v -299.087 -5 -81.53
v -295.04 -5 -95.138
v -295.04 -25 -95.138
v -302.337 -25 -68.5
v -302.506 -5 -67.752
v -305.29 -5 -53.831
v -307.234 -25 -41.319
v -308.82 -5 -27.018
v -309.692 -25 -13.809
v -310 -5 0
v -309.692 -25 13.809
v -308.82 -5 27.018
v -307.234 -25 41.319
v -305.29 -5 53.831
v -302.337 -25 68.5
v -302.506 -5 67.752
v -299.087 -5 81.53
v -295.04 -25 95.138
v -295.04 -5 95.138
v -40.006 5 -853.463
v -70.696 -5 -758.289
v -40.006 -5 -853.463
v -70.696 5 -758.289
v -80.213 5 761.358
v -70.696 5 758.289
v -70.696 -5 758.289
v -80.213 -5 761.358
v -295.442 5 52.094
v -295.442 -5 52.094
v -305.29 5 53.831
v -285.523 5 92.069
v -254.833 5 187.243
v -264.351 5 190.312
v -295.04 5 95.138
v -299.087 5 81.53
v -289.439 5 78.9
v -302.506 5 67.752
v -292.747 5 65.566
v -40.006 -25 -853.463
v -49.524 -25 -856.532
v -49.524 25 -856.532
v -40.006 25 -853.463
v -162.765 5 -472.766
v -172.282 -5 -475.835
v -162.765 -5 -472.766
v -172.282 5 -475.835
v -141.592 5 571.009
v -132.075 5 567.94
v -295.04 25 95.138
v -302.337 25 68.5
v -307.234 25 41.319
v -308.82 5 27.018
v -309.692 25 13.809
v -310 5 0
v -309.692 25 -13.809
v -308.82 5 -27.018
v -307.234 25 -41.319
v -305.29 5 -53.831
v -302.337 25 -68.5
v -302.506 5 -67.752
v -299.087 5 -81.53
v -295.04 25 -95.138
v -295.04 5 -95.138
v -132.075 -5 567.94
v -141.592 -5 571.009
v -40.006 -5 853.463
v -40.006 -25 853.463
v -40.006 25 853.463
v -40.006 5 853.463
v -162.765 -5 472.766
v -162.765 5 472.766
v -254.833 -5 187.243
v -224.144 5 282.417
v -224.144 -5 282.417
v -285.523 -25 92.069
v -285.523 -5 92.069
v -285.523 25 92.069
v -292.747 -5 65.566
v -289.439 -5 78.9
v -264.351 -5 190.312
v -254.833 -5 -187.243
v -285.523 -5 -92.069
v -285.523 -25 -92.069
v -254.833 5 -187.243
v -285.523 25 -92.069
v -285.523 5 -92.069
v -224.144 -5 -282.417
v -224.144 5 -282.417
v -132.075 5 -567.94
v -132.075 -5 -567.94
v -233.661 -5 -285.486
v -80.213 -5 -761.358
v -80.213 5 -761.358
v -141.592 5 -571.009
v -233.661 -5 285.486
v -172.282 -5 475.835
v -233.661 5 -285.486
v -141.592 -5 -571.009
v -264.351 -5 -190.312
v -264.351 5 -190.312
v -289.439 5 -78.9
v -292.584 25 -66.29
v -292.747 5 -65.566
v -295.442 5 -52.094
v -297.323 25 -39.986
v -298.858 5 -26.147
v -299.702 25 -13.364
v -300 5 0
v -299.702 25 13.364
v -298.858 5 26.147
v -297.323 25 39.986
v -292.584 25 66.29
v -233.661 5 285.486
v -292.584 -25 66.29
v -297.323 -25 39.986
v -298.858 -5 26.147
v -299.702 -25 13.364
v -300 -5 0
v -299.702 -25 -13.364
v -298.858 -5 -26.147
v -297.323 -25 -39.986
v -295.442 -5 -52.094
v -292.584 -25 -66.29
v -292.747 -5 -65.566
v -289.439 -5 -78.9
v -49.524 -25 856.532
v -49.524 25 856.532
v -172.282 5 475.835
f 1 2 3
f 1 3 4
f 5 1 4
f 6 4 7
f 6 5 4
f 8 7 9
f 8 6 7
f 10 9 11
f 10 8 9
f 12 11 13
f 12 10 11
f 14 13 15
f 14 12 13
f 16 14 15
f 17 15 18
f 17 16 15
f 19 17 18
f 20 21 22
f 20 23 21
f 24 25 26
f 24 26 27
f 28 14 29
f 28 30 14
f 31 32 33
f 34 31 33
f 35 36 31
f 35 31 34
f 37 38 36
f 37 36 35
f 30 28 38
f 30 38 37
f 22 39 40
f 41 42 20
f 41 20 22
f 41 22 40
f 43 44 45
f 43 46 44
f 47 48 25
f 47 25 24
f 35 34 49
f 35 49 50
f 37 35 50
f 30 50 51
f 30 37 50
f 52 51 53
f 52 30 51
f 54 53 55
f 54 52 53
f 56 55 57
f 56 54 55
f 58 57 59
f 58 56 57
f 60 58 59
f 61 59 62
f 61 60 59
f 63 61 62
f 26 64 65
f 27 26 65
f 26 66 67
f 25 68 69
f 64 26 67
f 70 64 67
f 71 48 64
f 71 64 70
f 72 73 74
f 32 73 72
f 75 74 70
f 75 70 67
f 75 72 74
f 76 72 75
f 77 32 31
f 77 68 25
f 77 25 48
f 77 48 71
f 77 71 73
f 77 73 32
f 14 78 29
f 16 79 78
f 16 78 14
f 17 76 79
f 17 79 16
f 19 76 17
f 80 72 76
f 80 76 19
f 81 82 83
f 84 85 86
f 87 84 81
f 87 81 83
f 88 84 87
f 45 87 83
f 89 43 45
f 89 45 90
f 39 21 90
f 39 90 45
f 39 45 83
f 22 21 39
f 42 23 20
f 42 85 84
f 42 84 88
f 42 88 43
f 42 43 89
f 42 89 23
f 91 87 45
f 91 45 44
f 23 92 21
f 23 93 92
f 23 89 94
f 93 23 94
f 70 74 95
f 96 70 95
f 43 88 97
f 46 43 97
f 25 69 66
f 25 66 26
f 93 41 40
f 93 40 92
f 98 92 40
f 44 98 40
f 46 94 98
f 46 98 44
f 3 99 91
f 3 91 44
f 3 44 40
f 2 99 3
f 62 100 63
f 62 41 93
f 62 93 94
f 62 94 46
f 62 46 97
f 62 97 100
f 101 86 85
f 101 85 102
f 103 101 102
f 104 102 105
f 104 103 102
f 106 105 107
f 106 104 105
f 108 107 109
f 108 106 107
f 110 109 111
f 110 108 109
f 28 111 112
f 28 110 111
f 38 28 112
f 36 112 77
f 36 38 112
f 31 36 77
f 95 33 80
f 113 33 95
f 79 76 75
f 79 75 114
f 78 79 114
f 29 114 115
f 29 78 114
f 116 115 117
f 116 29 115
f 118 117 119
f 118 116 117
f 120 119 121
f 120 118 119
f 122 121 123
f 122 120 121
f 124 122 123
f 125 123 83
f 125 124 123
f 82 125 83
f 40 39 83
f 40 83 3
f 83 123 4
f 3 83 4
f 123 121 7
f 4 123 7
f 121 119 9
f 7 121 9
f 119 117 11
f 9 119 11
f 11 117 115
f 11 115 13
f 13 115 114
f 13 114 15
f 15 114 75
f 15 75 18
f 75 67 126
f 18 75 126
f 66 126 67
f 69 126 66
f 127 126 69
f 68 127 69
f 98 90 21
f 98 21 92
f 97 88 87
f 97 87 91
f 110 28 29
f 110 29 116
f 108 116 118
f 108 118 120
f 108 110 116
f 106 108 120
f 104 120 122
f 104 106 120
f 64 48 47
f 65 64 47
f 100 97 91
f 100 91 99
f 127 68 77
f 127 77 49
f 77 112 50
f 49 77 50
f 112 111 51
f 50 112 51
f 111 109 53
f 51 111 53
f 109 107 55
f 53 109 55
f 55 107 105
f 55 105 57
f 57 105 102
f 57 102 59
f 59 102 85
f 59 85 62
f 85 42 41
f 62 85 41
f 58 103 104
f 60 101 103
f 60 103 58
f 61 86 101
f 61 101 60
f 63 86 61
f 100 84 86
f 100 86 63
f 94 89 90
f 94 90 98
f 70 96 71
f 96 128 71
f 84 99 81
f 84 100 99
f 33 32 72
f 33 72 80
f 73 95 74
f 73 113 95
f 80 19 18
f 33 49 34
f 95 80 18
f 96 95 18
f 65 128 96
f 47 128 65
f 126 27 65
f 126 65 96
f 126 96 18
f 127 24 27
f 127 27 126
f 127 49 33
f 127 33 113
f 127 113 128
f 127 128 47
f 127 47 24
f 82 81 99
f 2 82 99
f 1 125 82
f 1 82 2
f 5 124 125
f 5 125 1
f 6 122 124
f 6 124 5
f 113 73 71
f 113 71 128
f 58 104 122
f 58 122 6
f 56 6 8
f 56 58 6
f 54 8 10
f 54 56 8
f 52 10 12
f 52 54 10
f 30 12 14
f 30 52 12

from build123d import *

# Parameters (mm, degrees)
BOSS_EXTRUDE1_DEPTH   = 5
BOSS_EXTRUDE1_2_DEPTH = 5
BOSS_EXTRUDE1_3_DEPTH = 5
BOSS_EXTRUDE1_4_DEPTH = 5
BOSS_EXTRUDE1_5_DEPTH = 5
BOSS_EXTRUDE1_6_DEPTH = 5
BOSS_EXTRUDE1_7_DEPTH = 5
BOSS_EXTRUDE2_DEPTH   = 20
BOSS_EXTRUDE3_DEPTH   = 20


with BuildPart() as part:
    # Sketch3 → Boss-Extrude1 (new body, symmetric)
    with BuildSketch(Plane(origin=(0, 0, 0), x_dir=(1, 0, 0), z_dir=(0, 1, 0))):
        Polygon((-49.523523643, -856.532206403), (-40.006093165, -853.463246139), (-70.69569581, -758.288941363), (-80.213126288, -761.357901628), align=None)
    extrude(amount=BOSS_EXTRUDE1_DEPTH, both=True)



with BuildPart() as body_2:
    # Sketch3 → Boss-Extrude1 2 (new body, symmetric)
    with BuildSketch(Plane(origin=(0, 0, 0), x_dir=(1, 0, 0), z_dir=(0, 1, 0))):
        Polygon((-132.074901101, -567.940331812), (-141.592331578, -571.009292077), (-172.281934223, -475.834987302), (-162.764503746, -472.766027037), align=None)
    extrude(amount=BOSS_EXTRUDE1_2_DEPTH, both=True)


with BuildPart() as body_3:
    # Sketch3 → Boss-Extrude1 3 (new body, symmetric)
    with BuildSketch(Plane(origin=(0, 0, 0), x_dir=(1, 0, 0), z_dir=(0, 1, 0))):
        Polygon((-233.661139514, -285.486377751), (-224.143709036, -282.417417486), (-254.833311681, -187.243112711), (-264.350742159, -190.312072975), align=None)
    extrude(amount=BOSS_EXTRUDE1_3_DEPTH, both=True)


with BuildPart() as body_4:
    # Sketch3 → Boss-Extrude1 4 (new body, symmetric)
    with BuildSketch(Plane(origin=(0, 0, 0), x_dir=(1, 0, 0), z_dir=(0, 1, 0))):
        with BuildLine():
            Line((-305.290403434, -53.830935077), (-295.442325904, -52.0944533))
            ThreePointArc((-295.442325904, -52.0944533), (-300, 0), (-295.442325904, 52.0944533))
            Line((-295.442325904, 52.0944533), (-305.290403434, 53.830935077))
            ThreePointArc((-305.290403434, 53.830935077), (-310, 0), (-305.290403434, -53.830935077))
        make_face()
    extrude(amount=BOSS_EXTRUDE1_4_DEPTH, both=True)


with BuildPart() as body_5:
    # Sketch3 → Boss-Extrude1 5 (new body, symmetric)
    with BuildSketch(Plane(origin=(0, 0, 0), x_dir=(1, 0, 0), z_dir=(0, 1, 0))):
        Polygon((-254.833311681, 187.243112711), (-224.143709036, 282.417417486), (-233.661139514, 285.486377751), (-264.350742159, 190.312072975), align=None)
    extrude(amount=BOSS_EXTRUDE1_5_DEPTH, both=True)


with BuildPart() as body_6:
    # Sketch3 → Boss-Extrude1 6 (new body, symmetric)
    with BuildSketch(Plane(origin=(0, 0, 0), x_dir=(1, 0, 0), z_dir=(0, 1, 0))):
        Polygon((-70.69569581, 758.288941363), (-40.006093165, 853.463246139), (-49.523523643, 856.532206403), (-80.213126288, 761.357901628), align=None)
    extrude(amount=BOSS_EXTRUDE1_6_DEPTH, both=True)


with BuildPart() as body_7:
    # Sketch3 → Boss-Extrude1 7 (new body, symmetric)
    with BuildSketch(Plane(origin=(0, 0, 0), x_dir=(1, 0, 0), z_dir=(0, 1, 0))):
        Polygon((-162.764503746, 472.766027037), (-132.074901101, 567.940331812), (-141.592331578, 571.009292077), (-172.281934223, 475.834987302), align=None)
    extrude(amount=BOSS_EXTRUDE1_7_DEPTH, both=True)


with BuildPart() as part_1:
    add(part.part)

    add(body_2.part)  # Boss-Extrude2 merges body 2

    add(body_3.part)  # Boss-Extrude2 merges body 3

    add(body_4.part)  # Boss-Extrude2 merges body 4

    add(body_5.part)  # Boss-Extrude2 merges body 5

    add(body_6.part)  # Boss-Extrude2 merges body 6

    add(body_7.part)  # Boss-Extrude2 merges body 7
    # Sketch4 → Boss-Extrude2 (add)
    with BuildSketch(Plane(origin=(0, 5, 0), x_dir=(1, 0, 0), z_dir=(0, 1, 0))):
        with BuildLine():
            Line((-49.523523643, 856.532206403), (-40.006093165, 853.463246139))
            Line((-40.006093165, 853.463246139), (-285.522914326, 92.068807935))
            ThreePointArc((-285.522914326, 92.068807935), (-300, 0), (-285.522914326, -92.068807935))
            Line((-285.522914326, -92.068807935), (-40.006093165, -853.463246139))
            Line((-40.006093165, -853.463246139), (-49.523523643, -856.532206403))
            Line((-49.523523643, -856.532206403), (-295.040344804, -95.1377682))
            ThreePointArc((-295.040344804, -95.1377682), (-310, 0), (-295.040344804, 95.1377682))
            Line((-295.040344804, 95.1377682), (-49.523523643, 856.532206403))
        make_face()
    extrude(amount=BOSS_EXTRUDE2_DEPTH)

    # Sketch5 → Boss-Extrude3 (add)
    with BuildSketch(Plane.XZ.offset(5)):
        with BuildLine():
            Line((-49.523523643, 856.532206403), (-40.006093165, 853.463246139))
            Line((-40.006093165, 853.463246139), (-285.522914326, 92.068807935))
            ThreePointArc((-285.522914326, 92.068807935), (-300, 0), (-285.522914326, -92.068807935))
            Line((-285.522914326, -92.068807935), (-40.006093165, -853.463246139))
            Line((-40.006093165, -853.463246139), (-49.523523643, -856.532206403))
            Line((-49.523523643, -856.532206403), (-295.040344804, -95.1377682))
            ThreePointArc((-295.040344804, -95.1377682), (-310, 0), (-295.040344804, 95.1377682))
            Line((-295.040344804, 95.1377682), (-49.523523643, 856.532206403))
        make_face()
    extrude(amount=BOSS_EXTRUDE3_DEPTH)


solid = part_1.part
